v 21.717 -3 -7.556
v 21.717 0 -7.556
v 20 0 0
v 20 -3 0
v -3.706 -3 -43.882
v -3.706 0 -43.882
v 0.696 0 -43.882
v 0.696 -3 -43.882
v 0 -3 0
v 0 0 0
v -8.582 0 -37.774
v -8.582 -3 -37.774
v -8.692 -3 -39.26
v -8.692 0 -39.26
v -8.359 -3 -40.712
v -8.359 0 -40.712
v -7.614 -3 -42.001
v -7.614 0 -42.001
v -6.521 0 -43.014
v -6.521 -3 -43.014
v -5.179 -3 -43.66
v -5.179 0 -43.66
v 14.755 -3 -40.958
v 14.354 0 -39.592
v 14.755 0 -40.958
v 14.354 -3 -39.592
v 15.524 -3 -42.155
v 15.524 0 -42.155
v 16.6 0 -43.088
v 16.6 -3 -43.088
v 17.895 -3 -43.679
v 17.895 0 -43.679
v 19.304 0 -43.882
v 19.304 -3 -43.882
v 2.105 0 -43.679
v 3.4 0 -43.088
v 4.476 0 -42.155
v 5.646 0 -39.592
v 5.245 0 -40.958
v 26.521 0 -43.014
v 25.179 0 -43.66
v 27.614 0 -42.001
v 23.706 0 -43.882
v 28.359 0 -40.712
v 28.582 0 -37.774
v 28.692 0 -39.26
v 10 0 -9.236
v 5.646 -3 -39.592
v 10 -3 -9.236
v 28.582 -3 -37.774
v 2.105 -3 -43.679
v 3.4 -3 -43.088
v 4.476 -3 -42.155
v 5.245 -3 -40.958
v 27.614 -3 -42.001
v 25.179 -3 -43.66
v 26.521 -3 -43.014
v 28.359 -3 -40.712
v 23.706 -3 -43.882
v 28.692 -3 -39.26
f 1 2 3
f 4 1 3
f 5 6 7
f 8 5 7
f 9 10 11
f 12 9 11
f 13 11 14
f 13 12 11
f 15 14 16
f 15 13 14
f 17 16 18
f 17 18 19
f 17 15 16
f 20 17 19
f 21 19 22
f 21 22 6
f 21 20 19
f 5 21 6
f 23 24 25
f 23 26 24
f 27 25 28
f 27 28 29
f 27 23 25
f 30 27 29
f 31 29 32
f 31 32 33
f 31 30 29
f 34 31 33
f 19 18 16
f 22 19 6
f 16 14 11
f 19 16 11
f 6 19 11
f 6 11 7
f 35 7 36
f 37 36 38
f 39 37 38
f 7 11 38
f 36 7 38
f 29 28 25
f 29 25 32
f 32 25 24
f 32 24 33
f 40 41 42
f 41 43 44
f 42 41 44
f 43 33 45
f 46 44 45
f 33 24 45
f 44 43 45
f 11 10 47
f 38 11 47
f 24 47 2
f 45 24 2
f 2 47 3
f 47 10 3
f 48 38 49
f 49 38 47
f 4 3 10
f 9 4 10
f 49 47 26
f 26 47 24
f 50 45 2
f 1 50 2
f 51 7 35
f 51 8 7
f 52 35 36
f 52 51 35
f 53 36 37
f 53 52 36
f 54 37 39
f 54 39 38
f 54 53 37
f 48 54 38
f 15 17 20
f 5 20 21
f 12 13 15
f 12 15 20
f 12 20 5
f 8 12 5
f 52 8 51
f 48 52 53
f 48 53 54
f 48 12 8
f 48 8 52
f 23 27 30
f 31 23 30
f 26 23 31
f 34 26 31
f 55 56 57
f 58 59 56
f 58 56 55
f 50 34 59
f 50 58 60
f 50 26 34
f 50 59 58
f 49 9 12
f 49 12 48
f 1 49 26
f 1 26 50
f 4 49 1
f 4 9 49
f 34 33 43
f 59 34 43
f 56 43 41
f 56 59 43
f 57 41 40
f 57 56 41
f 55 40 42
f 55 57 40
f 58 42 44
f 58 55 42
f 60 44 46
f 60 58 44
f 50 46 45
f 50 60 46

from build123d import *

# Parameters (mm, degrees)
F1_DEPTH = 3
F2_R     = 5


with BuildPart() as f1:
    # F0 (on Front) → F1 (new body)
    with BuildSketch(Plane.XZ):
        Polygon((20, 0), (0, 0), (-9.969531, -43.881755), (5.030469, -43.881755), (10, -9.236355), (21.716592, -7.555729), align=None)
        Polygon((29.969531, -43.881755), (21.716592, -7.555729), (10, -9.236355), (14.969531, -43.881755), align=None)
    extrude(amount=F1_DEPTH)

    # F2
    f2_edges = [f1.edges().sort_by_distance(p)[0] for p in [
        (-9.969531, -1.5, -43.881755),
        (5.030469, -1.5, -43.881755),
        (14.969531, -1.5, -43.881755),
        (29.969531, -1.5, -43.881755),
    ]]
    fillet(f2_edges, radius=F2_R)


solid = f1.part
